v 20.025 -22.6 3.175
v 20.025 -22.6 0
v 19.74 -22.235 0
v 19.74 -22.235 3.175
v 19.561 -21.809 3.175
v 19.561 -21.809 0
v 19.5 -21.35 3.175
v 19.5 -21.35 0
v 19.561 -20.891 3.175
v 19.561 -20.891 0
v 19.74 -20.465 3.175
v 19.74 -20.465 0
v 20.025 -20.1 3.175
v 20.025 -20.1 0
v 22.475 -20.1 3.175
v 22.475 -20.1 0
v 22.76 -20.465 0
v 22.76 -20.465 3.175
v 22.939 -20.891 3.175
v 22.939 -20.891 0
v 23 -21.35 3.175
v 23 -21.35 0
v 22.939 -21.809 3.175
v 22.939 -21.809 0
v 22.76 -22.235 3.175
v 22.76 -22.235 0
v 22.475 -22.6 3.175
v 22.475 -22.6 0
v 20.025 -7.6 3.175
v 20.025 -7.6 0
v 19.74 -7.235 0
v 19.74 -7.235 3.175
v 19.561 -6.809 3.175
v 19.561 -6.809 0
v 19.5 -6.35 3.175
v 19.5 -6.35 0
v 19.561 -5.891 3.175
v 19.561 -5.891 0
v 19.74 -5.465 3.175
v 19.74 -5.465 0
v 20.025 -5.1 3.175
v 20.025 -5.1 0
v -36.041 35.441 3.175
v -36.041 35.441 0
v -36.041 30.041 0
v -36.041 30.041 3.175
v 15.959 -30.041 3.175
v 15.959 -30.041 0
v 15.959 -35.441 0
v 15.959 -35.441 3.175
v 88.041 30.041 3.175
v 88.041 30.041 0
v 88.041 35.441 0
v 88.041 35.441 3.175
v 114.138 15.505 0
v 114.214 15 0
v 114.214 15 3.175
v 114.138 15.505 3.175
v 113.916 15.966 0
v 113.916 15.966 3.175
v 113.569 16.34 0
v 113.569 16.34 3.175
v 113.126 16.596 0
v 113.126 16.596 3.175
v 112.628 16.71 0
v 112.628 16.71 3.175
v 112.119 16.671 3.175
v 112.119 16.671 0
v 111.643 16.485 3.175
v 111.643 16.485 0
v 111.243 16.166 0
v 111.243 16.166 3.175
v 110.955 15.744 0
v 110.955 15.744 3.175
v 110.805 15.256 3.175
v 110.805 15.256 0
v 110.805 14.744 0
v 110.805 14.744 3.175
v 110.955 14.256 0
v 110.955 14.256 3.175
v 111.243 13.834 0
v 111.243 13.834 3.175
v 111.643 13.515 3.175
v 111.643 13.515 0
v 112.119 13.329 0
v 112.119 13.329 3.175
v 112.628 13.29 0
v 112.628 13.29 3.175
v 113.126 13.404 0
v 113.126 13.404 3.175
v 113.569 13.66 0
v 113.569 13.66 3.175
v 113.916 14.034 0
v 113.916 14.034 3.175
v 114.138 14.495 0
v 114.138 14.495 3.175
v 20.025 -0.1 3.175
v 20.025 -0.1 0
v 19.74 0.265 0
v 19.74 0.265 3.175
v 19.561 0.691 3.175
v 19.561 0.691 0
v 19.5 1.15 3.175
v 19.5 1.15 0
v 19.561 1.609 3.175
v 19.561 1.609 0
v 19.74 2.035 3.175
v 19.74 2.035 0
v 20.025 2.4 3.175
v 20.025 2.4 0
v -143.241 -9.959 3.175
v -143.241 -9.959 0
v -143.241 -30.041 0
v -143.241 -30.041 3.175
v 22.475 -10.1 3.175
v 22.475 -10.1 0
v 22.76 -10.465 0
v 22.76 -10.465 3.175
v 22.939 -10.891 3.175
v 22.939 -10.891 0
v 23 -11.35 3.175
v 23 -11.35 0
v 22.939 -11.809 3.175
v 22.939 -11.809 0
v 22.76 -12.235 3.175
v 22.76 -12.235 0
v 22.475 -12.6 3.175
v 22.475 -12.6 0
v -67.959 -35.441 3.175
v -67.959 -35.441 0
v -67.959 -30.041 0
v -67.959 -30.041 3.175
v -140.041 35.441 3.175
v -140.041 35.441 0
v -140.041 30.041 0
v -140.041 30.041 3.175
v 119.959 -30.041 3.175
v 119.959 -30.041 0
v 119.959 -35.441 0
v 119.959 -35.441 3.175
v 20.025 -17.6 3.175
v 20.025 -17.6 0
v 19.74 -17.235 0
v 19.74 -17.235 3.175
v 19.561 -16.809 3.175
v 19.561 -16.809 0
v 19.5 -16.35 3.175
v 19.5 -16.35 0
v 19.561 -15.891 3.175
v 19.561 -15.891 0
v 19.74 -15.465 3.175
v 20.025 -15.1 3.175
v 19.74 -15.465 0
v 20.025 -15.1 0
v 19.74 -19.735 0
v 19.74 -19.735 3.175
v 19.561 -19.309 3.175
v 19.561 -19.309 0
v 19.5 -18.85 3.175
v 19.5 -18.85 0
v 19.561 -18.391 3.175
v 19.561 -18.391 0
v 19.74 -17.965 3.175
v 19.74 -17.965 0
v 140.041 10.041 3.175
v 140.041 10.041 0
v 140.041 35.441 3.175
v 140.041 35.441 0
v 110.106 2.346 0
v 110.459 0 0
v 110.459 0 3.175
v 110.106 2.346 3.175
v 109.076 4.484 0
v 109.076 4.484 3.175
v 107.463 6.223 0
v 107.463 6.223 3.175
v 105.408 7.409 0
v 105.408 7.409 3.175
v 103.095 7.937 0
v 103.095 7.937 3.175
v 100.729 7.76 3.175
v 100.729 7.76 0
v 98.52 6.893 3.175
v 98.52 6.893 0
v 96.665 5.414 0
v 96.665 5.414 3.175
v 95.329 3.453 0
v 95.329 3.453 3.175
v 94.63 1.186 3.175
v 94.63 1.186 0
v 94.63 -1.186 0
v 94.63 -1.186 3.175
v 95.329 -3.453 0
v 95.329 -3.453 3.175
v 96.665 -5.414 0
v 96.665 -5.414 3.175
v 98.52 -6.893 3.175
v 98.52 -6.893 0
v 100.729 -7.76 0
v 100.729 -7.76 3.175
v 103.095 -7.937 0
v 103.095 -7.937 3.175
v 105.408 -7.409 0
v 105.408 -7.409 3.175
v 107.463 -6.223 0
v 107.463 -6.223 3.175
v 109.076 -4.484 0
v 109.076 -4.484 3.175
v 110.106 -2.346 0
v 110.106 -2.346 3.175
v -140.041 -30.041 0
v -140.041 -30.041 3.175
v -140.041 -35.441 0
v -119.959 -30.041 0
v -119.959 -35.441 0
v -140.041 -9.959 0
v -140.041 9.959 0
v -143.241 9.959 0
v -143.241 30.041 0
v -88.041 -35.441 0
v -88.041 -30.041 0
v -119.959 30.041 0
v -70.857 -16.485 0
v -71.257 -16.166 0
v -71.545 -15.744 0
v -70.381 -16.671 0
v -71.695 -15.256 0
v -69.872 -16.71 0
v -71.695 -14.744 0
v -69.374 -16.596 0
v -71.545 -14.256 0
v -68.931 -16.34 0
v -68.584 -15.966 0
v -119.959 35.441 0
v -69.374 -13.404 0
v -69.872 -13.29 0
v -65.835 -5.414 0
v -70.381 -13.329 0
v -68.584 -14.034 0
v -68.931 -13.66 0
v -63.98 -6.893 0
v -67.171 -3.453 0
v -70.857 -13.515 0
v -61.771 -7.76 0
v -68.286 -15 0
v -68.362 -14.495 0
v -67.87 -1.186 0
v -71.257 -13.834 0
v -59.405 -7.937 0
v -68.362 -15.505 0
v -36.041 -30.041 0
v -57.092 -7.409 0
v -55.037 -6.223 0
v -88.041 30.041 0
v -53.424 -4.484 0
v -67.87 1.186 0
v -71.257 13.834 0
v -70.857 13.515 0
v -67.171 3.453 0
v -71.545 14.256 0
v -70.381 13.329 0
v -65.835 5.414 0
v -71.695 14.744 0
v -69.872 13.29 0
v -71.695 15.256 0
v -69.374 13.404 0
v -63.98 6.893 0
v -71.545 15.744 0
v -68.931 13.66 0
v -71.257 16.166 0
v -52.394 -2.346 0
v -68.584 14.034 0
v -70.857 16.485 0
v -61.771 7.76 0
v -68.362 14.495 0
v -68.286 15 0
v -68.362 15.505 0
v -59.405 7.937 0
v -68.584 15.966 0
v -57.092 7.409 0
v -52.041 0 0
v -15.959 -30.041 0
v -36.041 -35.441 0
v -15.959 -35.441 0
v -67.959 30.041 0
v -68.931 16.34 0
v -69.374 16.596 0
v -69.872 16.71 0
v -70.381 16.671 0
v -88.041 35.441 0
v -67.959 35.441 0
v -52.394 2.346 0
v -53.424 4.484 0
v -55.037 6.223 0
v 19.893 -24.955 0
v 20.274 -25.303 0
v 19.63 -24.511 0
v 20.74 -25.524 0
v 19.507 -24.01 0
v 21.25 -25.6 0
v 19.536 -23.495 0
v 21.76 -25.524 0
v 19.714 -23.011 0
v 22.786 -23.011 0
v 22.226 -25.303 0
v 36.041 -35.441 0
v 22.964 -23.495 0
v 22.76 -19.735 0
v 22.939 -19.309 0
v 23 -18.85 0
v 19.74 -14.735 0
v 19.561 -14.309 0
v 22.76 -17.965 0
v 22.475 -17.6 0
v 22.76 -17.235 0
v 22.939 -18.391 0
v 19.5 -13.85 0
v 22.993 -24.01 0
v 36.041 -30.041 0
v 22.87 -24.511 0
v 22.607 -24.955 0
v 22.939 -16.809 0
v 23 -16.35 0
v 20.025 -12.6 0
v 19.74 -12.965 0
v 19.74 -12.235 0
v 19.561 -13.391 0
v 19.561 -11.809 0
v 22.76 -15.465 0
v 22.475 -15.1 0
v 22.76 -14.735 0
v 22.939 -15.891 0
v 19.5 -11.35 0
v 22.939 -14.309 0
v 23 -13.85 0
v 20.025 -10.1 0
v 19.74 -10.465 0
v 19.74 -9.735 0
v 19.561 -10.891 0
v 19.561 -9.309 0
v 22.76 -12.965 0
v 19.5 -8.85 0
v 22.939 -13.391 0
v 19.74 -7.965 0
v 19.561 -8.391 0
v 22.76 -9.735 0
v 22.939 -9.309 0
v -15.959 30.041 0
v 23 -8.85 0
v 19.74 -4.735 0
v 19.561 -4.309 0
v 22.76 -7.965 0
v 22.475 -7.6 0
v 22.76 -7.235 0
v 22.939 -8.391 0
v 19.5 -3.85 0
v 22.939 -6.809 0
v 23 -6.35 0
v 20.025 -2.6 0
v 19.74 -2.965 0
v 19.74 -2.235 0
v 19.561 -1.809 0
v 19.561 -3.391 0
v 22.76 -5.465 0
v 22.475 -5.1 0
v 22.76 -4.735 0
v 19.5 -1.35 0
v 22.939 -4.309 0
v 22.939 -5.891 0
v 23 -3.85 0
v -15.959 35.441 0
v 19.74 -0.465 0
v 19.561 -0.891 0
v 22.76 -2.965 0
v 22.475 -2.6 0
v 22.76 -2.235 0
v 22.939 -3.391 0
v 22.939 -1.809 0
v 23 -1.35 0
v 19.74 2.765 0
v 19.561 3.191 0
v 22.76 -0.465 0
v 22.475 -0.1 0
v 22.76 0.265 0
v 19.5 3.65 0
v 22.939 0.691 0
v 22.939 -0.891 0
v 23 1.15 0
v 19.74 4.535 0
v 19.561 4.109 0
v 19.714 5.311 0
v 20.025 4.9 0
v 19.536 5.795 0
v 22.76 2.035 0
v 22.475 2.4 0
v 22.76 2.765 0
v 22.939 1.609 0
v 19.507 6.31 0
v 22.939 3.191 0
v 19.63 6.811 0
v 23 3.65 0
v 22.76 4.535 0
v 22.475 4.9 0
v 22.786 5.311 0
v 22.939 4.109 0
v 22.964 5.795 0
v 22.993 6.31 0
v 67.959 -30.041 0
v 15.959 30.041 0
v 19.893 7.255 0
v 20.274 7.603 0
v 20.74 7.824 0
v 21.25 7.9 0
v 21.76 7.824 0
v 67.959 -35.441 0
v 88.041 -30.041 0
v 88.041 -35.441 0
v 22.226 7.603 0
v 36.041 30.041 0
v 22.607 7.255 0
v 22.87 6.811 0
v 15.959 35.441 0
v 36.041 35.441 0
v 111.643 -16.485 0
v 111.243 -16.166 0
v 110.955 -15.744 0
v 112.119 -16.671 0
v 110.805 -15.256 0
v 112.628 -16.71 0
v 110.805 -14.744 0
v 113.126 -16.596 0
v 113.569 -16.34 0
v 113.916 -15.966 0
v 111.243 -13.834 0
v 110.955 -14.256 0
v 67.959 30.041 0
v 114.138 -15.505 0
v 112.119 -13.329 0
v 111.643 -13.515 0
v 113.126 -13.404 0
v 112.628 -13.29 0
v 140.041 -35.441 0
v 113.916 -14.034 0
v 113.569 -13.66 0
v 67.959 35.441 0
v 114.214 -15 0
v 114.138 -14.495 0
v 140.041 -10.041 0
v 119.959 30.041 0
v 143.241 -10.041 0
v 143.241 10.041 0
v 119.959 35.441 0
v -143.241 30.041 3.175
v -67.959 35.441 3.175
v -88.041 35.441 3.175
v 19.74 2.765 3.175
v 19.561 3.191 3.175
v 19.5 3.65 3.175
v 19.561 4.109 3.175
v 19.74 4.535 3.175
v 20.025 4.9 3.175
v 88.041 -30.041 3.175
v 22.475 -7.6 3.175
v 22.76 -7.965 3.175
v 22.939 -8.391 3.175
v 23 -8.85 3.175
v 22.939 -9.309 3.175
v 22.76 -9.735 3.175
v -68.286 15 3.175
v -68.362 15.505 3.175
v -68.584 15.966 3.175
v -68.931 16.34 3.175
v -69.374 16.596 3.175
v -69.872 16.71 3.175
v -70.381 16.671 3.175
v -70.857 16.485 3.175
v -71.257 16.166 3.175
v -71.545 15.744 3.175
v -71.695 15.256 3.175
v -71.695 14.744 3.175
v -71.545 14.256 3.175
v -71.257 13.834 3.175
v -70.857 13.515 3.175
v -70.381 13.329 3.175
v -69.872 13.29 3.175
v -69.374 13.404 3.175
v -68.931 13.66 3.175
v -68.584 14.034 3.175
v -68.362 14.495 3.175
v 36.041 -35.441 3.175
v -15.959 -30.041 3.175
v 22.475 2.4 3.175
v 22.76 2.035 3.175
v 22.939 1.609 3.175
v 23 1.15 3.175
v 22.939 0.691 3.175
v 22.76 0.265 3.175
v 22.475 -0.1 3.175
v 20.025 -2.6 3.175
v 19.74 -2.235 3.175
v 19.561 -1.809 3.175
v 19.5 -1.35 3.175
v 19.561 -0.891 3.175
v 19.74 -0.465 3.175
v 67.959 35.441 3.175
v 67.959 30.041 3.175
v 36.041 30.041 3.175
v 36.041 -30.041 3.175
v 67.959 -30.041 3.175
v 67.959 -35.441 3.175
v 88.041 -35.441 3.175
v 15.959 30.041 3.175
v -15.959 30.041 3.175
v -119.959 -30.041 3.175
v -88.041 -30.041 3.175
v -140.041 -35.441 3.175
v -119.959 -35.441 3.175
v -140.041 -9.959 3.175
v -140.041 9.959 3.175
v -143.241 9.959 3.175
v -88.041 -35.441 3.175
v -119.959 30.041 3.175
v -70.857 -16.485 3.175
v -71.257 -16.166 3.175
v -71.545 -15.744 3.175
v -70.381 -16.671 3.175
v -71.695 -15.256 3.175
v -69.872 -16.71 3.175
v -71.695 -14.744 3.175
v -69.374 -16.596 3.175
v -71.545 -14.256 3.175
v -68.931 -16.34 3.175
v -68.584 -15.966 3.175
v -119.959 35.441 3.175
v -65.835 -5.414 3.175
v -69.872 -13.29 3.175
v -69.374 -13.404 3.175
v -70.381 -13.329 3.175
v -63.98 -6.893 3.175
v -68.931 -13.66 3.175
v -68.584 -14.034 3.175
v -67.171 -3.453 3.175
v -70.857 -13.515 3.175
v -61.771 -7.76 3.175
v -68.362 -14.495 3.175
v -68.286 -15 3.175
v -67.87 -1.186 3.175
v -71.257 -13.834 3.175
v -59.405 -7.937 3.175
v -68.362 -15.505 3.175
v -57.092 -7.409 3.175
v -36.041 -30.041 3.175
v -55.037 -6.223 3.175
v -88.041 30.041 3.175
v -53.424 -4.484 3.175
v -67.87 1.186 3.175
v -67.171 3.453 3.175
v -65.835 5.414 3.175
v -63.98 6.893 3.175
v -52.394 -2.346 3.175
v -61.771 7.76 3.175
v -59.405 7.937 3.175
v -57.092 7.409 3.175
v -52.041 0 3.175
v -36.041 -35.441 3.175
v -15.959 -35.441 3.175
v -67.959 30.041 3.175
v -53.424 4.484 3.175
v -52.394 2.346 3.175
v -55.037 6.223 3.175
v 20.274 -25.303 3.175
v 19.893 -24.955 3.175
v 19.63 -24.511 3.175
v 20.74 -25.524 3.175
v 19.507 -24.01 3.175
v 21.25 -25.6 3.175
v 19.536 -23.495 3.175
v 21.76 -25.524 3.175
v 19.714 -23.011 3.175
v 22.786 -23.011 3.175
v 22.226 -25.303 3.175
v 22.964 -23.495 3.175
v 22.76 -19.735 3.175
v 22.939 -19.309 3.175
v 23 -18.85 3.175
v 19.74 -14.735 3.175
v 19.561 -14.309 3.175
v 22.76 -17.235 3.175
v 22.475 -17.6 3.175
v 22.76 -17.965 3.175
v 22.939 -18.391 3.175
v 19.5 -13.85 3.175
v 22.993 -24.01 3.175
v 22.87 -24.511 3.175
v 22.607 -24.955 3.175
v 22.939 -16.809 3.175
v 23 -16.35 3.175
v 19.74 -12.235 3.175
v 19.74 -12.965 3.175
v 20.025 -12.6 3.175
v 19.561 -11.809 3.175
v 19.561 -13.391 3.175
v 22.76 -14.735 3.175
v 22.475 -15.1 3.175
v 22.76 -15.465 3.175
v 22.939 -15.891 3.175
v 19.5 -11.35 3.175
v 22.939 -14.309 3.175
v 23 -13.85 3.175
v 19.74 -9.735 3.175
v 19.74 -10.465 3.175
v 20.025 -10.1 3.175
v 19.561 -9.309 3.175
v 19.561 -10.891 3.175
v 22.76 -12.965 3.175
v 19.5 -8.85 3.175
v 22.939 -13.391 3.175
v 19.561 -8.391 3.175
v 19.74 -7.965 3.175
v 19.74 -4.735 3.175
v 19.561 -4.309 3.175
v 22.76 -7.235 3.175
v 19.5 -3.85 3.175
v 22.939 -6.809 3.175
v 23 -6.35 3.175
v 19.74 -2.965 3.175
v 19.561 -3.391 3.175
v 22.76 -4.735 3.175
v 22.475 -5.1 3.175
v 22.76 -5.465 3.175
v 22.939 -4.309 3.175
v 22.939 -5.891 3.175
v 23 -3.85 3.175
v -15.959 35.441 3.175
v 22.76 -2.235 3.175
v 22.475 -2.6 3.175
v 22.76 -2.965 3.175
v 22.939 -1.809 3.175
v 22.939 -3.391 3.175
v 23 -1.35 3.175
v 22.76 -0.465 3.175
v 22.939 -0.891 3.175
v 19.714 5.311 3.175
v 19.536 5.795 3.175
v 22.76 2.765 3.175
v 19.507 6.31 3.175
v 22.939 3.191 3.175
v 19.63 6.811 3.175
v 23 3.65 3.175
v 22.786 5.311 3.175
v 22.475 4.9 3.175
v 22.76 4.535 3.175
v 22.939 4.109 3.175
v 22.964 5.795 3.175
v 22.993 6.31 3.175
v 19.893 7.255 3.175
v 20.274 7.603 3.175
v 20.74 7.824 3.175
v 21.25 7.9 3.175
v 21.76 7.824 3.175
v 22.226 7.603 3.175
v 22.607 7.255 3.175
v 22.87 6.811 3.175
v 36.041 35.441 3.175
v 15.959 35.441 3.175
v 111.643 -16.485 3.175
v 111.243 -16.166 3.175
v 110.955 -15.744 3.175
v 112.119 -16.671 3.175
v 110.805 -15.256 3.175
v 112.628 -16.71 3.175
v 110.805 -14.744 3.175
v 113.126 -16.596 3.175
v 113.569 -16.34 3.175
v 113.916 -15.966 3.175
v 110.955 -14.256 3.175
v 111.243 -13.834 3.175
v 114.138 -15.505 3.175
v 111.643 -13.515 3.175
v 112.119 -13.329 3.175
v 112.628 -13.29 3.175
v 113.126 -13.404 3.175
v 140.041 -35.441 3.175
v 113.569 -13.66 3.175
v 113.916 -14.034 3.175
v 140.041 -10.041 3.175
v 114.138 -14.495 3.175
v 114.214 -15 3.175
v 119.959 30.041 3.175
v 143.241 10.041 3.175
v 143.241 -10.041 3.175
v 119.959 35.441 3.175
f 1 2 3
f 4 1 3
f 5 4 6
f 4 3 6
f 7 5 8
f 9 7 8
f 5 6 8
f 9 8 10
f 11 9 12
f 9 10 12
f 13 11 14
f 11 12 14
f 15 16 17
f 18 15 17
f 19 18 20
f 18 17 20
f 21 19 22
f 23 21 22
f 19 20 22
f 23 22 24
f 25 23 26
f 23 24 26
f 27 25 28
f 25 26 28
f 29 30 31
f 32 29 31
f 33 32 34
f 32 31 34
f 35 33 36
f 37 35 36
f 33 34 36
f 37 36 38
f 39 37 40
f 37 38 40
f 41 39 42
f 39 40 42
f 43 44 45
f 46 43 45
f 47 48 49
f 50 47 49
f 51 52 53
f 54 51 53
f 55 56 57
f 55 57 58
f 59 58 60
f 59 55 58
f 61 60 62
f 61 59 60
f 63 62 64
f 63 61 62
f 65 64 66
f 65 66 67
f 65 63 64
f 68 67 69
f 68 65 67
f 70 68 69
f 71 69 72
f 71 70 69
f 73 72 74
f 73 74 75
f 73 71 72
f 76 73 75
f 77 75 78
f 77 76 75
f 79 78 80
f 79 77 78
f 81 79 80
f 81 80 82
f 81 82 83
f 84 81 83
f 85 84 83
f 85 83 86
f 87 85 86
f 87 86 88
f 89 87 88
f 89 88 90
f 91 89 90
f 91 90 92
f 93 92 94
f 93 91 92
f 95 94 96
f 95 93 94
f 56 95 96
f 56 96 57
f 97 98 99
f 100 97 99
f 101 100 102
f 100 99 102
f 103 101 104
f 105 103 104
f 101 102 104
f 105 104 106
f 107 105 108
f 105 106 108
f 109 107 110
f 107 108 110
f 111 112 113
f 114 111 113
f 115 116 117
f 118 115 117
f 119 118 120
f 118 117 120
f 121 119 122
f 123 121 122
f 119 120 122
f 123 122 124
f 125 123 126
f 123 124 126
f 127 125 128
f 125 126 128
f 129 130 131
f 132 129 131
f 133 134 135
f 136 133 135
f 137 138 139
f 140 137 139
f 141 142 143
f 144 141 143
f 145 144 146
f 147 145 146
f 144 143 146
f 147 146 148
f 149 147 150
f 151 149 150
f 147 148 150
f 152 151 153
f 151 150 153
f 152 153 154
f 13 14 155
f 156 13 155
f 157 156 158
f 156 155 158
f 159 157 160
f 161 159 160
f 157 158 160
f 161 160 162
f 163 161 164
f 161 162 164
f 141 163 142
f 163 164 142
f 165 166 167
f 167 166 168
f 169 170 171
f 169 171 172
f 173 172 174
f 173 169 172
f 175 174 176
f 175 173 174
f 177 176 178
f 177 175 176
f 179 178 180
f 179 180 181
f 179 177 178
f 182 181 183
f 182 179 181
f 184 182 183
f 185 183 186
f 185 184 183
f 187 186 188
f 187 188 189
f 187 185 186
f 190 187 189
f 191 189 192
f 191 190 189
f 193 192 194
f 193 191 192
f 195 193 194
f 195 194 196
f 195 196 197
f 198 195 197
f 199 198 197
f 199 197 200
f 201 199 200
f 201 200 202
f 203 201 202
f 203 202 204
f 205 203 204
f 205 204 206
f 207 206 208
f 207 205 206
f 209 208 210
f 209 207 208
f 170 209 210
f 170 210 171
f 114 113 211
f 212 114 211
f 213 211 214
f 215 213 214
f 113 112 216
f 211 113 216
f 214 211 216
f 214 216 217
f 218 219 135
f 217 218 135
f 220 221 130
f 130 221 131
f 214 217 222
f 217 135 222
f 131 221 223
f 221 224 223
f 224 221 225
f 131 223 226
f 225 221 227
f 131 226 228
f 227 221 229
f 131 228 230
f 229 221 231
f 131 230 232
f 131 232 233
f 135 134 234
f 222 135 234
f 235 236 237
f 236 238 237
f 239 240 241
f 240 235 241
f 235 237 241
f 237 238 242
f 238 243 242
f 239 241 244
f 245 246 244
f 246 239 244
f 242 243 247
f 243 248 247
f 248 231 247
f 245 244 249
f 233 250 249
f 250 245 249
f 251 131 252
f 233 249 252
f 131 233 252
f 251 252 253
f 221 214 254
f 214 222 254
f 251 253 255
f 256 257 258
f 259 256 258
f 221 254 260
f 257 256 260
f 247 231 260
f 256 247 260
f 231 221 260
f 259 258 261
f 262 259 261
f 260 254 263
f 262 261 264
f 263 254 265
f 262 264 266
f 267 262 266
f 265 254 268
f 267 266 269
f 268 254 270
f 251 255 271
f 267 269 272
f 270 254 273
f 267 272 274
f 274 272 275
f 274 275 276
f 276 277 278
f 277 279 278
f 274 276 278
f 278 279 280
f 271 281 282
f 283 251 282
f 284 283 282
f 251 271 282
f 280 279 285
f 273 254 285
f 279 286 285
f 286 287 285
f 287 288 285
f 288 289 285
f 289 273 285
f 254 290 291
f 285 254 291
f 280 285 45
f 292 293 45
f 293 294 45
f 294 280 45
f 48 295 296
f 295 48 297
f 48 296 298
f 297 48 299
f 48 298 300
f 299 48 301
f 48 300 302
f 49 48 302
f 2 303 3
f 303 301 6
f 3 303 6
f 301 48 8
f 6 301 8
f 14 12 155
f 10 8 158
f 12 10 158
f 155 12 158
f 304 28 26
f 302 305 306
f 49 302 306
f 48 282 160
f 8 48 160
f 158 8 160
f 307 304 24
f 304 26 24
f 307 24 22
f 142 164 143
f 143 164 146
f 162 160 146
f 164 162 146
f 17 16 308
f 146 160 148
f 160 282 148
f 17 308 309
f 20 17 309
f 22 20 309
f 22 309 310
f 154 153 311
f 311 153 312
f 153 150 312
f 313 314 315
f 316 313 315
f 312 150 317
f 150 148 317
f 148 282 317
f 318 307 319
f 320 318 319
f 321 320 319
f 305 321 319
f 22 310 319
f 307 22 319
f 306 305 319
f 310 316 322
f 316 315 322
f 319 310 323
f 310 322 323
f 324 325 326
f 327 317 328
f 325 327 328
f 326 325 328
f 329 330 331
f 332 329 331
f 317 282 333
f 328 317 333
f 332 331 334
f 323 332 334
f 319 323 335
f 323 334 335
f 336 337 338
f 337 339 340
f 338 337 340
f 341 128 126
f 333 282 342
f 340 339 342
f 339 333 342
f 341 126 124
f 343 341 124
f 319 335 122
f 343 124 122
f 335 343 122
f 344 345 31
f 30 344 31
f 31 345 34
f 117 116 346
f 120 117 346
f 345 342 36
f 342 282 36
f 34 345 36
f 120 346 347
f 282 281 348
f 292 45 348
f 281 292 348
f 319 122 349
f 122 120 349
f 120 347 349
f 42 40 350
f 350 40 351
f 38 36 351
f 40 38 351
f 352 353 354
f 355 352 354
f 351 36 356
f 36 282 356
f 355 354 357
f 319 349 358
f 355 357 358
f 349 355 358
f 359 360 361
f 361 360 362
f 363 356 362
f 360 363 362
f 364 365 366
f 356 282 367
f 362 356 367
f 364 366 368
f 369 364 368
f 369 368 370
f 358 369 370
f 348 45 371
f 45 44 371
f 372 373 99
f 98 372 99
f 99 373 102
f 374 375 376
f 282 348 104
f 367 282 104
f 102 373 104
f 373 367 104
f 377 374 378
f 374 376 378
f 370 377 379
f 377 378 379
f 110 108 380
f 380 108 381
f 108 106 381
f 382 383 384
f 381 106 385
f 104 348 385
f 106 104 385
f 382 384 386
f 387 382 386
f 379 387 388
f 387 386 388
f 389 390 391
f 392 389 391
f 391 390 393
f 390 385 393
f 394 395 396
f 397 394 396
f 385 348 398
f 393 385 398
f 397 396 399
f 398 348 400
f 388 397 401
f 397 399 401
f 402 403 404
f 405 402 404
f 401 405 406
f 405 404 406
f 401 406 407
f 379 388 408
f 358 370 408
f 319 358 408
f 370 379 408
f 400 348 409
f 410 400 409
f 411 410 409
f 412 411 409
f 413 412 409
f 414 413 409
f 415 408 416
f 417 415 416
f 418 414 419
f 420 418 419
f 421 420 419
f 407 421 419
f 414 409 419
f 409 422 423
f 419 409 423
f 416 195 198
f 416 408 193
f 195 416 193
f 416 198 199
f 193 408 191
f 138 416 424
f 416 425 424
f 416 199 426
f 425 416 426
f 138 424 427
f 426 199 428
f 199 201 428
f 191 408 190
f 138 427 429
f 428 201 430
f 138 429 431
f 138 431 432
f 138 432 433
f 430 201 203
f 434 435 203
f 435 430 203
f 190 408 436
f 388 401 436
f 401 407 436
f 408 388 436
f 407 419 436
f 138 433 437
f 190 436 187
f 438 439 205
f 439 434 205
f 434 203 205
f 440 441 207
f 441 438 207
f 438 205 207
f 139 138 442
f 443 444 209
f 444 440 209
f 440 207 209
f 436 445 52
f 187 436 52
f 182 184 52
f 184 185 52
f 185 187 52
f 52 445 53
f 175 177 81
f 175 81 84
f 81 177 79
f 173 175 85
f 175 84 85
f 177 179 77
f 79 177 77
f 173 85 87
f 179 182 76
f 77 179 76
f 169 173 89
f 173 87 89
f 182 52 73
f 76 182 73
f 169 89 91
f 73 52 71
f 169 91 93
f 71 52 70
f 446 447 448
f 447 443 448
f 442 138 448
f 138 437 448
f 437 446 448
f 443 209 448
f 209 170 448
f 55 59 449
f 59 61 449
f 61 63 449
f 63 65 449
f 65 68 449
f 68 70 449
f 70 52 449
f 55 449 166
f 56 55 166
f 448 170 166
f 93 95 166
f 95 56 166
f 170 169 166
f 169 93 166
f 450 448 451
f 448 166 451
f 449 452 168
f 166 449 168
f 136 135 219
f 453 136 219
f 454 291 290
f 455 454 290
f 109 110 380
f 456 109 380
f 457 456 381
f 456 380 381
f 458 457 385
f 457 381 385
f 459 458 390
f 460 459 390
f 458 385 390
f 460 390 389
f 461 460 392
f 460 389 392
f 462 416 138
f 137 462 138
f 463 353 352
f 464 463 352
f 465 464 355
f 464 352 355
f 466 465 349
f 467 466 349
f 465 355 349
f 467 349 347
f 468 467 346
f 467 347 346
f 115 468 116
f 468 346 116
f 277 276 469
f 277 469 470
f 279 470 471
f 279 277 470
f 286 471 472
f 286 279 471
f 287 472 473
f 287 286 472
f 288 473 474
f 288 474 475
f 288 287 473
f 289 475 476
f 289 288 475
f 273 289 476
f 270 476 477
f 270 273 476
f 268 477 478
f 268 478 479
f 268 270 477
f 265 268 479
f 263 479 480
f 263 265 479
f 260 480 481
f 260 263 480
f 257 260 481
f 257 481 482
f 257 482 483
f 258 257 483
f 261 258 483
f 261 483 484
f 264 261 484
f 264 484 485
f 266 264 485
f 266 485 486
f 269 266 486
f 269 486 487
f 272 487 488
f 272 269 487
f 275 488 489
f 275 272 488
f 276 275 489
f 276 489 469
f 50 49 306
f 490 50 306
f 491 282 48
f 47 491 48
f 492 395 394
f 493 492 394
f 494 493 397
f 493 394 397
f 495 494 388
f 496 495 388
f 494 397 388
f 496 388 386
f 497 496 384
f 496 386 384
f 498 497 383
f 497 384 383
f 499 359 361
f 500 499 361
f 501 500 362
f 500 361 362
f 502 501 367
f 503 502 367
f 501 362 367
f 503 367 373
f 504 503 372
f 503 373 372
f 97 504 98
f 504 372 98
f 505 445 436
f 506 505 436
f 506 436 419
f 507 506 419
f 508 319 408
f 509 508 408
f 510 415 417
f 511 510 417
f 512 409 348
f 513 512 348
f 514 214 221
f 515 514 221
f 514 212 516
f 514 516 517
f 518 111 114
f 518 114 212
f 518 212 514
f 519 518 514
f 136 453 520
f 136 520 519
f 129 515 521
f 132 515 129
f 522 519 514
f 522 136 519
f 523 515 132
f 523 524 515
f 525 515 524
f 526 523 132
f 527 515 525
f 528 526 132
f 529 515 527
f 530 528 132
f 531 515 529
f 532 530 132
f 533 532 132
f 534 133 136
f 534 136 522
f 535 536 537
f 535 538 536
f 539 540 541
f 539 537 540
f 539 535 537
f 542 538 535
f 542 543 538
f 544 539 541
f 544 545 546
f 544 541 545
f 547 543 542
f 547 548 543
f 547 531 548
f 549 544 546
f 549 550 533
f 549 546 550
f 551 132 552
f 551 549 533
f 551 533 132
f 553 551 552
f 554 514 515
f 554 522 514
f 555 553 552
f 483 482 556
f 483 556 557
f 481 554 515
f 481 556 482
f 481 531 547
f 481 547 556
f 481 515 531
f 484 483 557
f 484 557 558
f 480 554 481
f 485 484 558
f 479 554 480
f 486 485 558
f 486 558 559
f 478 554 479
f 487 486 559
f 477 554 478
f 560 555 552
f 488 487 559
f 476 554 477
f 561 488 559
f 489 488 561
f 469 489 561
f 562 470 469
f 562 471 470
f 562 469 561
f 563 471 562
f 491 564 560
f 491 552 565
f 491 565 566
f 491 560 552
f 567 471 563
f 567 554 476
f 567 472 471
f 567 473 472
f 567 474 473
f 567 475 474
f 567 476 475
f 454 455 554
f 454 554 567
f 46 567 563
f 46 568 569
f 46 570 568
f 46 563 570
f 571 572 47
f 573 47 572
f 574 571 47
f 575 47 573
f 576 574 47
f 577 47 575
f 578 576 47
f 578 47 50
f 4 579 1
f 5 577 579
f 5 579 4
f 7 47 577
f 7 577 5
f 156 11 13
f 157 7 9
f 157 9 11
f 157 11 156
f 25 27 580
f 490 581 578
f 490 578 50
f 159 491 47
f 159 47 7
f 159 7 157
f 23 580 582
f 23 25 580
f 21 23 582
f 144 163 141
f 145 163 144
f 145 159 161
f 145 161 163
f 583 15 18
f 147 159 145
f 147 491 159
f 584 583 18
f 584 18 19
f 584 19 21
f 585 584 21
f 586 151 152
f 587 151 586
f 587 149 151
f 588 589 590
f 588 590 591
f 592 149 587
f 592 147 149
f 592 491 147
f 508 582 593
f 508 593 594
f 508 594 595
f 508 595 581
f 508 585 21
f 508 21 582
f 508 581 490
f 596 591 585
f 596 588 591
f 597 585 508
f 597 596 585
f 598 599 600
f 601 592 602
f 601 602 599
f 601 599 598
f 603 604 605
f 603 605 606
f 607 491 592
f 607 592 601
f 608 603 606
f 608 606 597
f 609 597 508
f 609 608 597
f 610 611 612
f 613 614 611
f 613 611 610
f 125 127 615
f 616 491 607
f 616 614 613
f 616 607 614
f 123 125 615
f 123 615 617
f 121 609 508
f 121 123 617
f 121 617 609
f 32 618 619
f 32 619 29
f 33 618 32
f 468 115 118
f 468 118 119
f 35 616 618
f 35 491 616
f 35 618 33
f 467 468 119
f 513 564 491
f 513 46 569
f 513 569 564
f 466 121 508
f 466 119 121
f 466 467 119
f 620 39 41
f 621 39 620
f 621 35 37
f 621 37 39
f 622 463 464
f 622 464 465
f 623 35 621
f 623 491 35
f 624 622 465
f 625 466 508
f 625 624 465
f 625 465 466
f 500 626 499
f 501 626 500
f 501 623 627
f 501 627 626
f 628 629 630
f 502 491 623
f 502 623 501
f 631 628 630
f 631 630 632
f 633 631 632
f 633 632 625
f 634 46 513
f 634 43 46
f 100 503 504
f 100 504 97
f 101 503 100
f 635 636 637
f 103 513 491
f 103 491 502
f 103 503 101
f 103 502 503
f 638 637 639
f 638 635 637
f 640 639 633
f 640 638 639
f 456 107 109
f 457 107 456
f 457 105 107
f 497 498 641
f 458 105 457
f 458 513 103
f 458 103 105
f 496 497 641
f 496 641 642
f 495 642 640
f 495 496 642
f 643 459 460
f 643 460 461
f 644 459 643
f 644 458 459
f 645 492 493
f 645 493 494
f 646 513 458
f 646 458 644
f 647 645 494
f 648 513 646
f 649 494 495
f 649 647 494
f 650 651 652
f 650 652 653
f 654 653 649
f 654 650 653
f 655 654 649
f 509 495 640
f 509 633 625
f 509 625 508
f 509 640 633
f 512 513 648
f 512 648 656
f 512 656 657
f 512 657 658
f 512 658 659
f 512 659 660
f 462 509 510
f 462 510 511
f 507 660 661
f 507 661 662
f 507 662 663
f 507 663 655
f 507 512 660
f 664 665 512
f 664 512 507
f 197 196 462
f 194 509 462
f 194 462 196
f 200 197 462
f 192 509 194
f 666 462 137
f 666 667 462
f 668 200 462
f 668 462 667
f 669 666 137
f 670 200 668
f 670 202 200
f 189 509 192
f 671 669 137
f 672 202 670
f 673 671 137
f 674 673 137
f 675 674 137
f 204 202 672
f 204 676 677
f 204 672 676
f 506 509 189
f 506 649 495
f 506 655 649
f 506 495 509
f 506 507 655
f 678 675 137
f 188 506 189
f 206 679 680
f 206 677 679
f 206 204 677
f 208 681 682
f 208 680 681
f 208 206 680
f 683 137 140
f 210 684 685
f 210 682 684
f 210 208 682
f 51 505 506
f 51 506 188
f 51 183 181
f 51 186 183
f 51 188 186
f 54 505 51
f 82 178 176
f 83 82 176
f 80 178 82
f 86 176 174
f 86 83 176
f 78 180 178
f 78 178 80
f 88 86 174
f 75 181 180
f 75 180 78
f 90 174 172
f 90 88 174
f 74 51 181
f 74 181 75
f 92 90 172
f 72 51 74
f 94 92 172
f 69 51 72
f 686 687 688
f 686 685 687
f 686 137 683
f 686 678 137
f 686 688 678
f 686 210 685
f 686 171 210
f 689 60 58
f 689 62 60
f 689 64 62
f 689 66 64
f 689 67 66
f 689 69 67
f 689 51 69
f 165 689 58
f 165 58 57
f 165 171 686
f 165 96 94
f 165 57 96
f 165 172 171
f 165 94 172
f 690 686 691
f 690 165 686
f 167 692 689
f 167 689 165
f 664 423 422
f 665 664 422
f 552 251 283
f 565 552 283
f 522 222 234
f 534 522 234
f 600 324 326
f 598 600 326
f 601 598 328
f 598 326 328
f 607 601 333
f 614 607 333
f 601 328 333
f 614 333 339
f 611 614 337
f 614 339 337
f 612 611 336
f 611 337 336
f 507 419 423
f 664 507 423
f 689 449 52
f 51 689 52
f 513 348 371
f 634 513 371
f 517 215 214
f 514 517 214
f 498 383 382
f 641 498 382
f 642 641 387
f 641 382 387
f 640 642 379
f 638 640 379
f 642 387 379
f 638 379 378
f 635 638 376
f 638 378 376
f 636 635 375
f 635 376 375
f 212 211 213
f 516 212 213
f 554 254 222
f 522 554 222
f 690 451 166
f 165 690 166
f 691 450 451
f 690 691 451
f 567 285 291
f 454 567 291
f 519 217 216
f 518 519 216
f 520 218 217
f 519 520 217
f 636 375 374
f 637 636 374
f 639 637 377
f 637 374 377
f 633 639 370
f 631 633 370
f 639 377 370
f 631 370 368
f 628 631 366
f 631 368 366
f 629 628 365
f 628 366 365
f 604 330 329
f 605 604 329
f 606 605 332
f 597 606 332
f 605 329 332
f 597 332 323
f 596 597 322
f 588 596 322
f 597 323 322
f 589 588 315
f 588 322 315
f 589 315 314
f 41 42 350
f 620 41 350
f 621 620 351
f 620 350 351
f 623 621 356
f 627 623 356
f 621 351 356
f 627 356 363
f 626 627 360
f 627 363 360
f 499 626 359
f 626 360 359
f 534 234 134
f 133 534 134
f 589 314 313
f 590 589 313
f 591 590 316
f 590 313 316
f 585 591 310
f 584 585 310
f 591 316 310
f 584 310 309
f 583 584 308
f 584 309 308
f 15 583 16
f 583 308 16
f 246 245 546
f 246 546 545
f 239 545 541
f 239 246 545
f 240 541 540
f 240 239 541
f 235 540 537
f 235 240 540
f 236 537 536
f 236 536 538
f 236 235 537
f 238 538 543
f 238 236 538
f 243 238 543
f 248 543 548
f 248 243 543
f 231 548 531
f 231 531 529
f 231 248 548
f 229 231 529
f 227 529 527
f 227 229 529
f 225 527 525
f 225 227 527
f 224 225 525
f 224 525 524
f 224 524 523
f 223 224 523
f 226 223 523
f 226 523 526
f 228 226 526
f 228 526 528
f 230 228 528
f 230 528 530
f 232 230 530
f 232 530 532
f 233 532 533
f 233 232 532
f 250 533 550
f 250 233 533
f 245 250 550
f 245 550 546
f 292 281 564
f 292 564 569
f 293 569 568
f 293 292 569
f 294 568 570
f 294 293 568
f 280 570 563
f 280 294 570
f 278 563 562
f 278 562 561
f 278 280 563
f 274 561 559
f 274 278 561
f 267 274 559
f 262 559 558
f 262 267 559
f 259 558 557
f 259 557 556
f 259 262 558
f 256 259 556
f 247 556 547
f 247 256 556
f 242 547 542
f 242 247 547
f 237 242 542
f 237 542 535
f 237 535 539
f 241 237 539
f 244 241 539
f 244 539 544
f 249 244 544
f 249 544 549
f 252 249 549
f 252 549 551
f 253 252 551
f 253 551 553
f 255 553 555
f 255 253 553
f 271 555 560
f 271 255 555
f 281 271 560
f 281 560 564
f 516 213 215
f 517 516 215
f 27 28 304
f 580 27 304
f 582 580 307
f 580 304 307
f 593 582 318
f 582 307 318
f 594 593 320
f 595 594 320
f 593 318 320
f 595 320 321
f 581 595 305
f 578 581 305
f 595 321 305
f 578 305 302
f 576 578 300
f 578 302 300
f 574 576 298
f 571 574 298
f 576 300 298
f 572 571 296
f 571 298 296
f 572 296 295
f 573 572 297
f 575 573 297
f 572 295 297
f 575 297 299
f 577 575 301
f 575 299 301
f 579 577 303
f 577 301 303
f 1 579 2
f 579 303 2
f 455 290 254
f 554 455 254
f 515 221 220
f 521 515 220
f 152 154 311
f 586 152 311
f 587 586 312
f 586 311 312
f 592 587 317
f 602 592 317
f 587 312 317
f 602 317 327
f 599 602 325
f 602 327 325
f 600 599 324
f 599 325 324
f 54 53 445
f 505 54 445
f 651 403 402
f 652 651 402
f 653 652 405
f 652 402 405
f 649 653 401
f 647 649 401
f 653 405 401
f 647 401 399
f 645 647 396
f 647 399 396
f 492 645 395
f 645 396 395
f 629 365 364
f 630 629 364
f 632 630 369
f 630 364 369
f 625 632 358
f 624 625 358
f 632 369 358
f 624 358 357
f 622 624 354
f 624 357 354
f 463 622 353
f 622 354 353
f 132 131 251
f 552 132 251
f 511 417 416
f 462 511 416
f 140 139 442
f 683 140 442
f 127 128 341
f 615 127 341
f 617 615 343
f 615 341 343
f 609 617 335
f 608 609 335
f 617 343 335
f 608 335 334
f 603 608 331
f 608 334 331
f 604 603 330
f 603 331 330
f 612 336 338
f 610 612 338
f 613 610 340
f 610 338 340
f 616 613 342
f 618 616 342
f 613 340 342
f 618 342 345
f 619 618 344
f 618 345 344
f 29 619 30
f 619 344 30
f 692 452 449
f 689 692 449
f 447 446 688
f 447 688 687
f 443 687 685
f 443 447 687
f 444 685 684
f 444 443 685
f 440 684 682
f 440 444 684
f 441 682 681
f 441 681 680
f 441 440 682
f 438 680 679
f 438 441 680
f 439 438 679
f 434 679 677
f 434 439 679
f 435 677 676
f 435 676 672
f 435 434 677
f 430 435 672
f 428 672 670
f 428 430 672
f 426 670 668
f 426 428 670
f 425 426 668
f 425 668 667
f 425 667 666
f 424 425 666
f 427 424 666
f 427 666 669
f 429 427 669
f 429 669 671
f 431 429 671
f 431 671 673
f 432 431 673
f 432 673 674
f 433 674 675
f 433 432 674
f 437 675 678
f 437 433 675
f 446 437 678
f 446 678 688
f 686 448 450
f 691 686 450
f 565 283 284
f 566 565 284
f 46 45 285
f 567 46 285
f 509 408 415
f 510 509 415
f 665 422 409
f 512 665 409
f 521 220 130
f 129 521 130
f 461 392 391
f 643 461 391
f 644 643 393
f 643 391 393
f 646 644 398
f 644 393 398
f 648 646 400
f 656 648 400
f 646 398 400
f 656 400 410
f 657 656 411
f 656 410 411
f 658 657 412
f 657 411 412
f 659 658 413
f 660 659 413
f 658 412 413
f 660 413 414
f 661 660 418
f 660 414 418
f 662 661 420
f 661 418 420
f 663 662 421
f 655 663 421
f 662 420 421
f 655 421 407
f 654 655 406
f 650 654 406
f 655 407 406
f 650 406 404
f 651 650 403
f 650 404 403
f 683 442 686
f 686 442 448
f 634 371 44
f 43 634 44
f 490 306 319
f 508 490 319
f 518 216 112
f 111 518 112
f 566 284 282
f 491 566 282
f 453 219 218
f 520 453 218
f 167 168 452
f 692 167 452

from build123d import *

# Parameters (mm, degrees)
BOSS_EXTRUDE1_OUTLINE_R   = 1.755
BOSS_EXTRUDE1_OUTLINE_R_2 = 8
BOSS_EXTRUDE1_DEPTH       = 3.175
BOSS_EXTRUDE2_START       = -3.175
SKETCH5_R                 = 7.95936
SKETCH5_R_2               = 1.71436
BOSS_EXTRUDE2_DEPTH       = 3.175


# Read off the part's stored shape, not the designer's step: Boss-Extrude1
with BuildPart() as part:
    # Boss-Extrude1 outline → Boss-Extrude1 (new body)
    with BuildSketch(Plane.XY):
        Polygon((-140, 10), (-140, -10), (-143.2, -10), (-143.2, -30), (-140, -30), (-140, -35.4), (-120, -35.4), (-120, -30), (-88, -30), (-88, -35.4), (-68, -35.4), (-68, -30), (-36, -30), (-36, -35.4), (-16, -35.4), (-16, -30), (16, -30), (16, -35.4), (36, -35.4), (36, -30), (68, -30), (68, -35.4), (88, -35.4), (88, -30), (120, -30), (120, -35.4), (140, -35.4), (140, -10), (143.2, -10), (143.2, 10), (140, 10), (140, 35.4), (120, 35.4), (120, 30), (88, 30), (88, 35.4), (68, 35.4), (68, 30), (36, 30), (36, 35.4), (16, 35.4), (16, 30), (-16, 30), (-16, 35.4), (-36, 35.4), (-36, 30), (-68, 30), (-68, 35.4), (-88, 35.4), (-88, 30), (-120, 30), (-120, 35.4), (-140, 35.4), (-140, 30), (-143.2, 30), (-143.2, 10), align=None)
        with Locations((-70, -15)):
            Circle(BOSS_EXTRUDE1_OUTLINE_R, mode=Mode.SUBTRACT)
        with BuildLine():
            ThreePointArc((22.474744871, -20.1), (23, -21.35), (22.474744871, -22.6))
            ThreePointArc((22.474744871, -22.6), (21.25, -25.6), (20.025255129, -22.6))
            ThreePointArc((20.025255129, -22.6), (19.5, -21.35), (20.025255129, -20.1))
            ThreePointArc((20.025255129, -20.1), (19.5, -18.85), (20.025255129, -17.6))
            ThreePointArc((20.025255129, -17.6), (19.5, -16.35), (20.025255129, -15.1))
            ThreePointArc((20.025255129, -15.1), (19.5, -13.85), (20.025255129, -12.6))
            ThreePointArc((20.025255129, -12.6), (19.5, -11.35), (20.025255129, -10.1))
            ThreePointArc((20.025255129, -10.1), (19.5, -8.85), (20.025255129, -7.6))
            ThreePointArc((20.025255129, -7.6), (19.5, -6.35), (20.025255129, -5.1))
            ThreePointArc((20.025255129, -5.1), (19.5, -3.85), (20.025255129, -2.6))
            ThreePointArc((20.025255129, -2.6), (19.5, -1.35), (20.025255129, -0.1))
            ThreePointArc((20.025255129, -0.1), (19.5, 1.15), (20.025255129, 2.4))
            ThreePointArc((20.025255129, 2.4), (19.5, 3.65), (20.025255129, 4.9))
            ThreePointArc((20.025255129, 4.9), (21.25, 7.9), (22.474744871, 4.9))
            ThreePointArc((22.474744871, 4.9), (23, 3.65), (22.474744871, 2.4))
            ThreePointArc((22.474744871, 2.4), (23, 1.15), (22.474744871, -0.1))
            ThreePointArc((22.474744871, -0.1), (23, -1.35), (22.474744871, -2.6))
            ThreePointArc((22.474744871, -2.6), (23, -3.85), (22.474744871, -5.1))
            ThreePointArc((22.474744871, -5.1), (23, -6.35), (22.474744871, -7.6))
            ThreePointArc((22.474744871, -7.6), (23, -8.85), (22.474744871, -10.1))
            ThreePointArc((22.474744871, -10.1), (23, -11.35), (22.474744871, -12.6))
            ThreePointArc((22.474744871, -12.6), (23, -13.85), (22.474744871, -15.1))
            ThreePointArc((22.474744871, -15.1), (23, -16.35), (22.474744871, -17.6))
            ThreePointArc((22.474744871, -17.6), (23, -18.85), (22.474744871, -20.1))
        make_face(mode=Mode.SUBTRACT)
        with Locations((112.5, -15)):
            Circle(BOSS_EXTRUDE1_OUTLINE_R, mode=Mode.SUBTRACT)
        with Locations((-60, 0)):
            Circle(BOSS_EXTRUDE1_OUTLINE_R_2, mode=Mode.SUBTRACT)
        with Locations((-70, 15)):
            Circle(BOSS_EXTRUDE1_OUTLINE_R, mode=Mode.SUBTRACT)
        with Locations((102.5, 0)):
            Circle(BOSS_EXTRUDE1_OUTLINE_R_2, mode=Mode.SUBTRACT)
        with Locations((112.5, 15)):
            Circle(BOSS_EXTRUDE1_OUTLINE_R, mode=Mode.SUBTRACT)
    extrude(amount=BOSS_EXTRUDE1_DEPTH)

    # Sketch5 → Boss-Extrude2 (add)
    with BuildSketch(Plane.XY.offset(3.175).offset(BOSS_EXTRUDE2_START)):
        Polygon((140.04064, 10.04064), (140.04064, 35.44064), (119.95936, 35.44064), (119.95936, 30.04064), (88.04064, 30.04064), (88.04064, 35.44064), (67.95936, 35.44064), (67.95936, 30.04064), (36.04064, 30.04064), (36.04064, 35.44064), (15.95936, 35.44064), (15.95936, 30.04064), (-15.95936, 30.04064), (-15.95936, 35.44064), (-36.04064, 35.44064), (-36.04064, 30.04064), (-67.95936, 30.04064), (-67.95936, 35.44064), (-88.04064, 35.44064), (-88.04064, 30.04064), (-119.95936, 30.04064), (-119.95936, 35.44064), (-140.04064, 35.44064), (-140.04064, 30.04064), (-143.24064, 30.04064), (-143.24064, 9.95936), (-140.04064, 9.95936), (-140.04064, -9.95936), (-143.24064, -9.95936), (-143.24064, -30.04064), (-140.04064, -30.04064), (-140.04064, -35.44064), (-119.95936, -35.44064), (-119.95936, -30.04064), (-88.04064, -30.04064), (-88.04064, -35.44064), (-67.95936, -35.44064), (-67.95936, -30.04064), (-36.04064, -30.04064), (-36.04064, -35.44064), (-15.95936, -35.44064), (-15.95936, -30.04064), (15.95936, -30.04064), (15.95936, -35.44064), (36.04064, -35.44064), (36.04064, -30.04064), (67.95936, -30.04064), (67.95936, -35.44064), (88.04064, -35.44064), (88.04064, -30.04064), (119.95936, -30.04064), (119.95936, -35.44064), (140.04064, -35.44064), (140.04064, -10.04064), (143.24064, -10.04064), (143.24064, 10.04064), align=None)
        with Locations((-60, 0)):
            Circle(SKETCH5_R, mode=Mode.SUBTRACT)
        with Locations((-70, 15)):
            Circle(SKETCH5_R_2, mode=Mode.SUBTRACT)
        with Locations((-70, -15)):
            Circle(SKETCH5_R_2, mode=Mode.SUBTRACT)
        with Locations((102.5, 0)):
            Circle(SKETCH5_R, mode=Mode.SUBTRACT)
        with Locations((112.5, 15)):
            Circle(SKETCH5_R_2, mode=Mode.SUBTRACT)
        with Locations((112.5, -15)):
            Circle(SKETCH5_R_2, mode=Mode.SUBTRACT)
        with BuildLine():
            ThreePointArc((22.474744871, 4.9), (21.25, 7.9), (20.025255129, 4.9))
            ThreePointArc((20.025255129, 4.9), (19.5, 3.65), (20.025255129, 2.4))
            ThreePointArc((20.025255129, 2.4), (19.5, 1.15), (20.025255129, -0.1))
            ThreePointArc((20.025255129, -0.1), (19.5, -1.35), (20.025255129, -2.6))
            ThreePointArc((20.025255129, -2.6), (19.5, -3.85), (20.025255129, -5.1))
            ThreePointArc((20.025255129, -5.1), (19.5, -6.35), (20.025255129, -7.6))
            ThreePointArc((20.025255129, -7.6), (19.5, -8.85), (20.025255129, -10.1))
            ThreePointArc((20.025255129, -10.1), (19.5, -11.35), (20.025255129, -12.6))
            ThreePointArc((20.025255129, -12.6), (19.5, -13.85), (20.025255129, -15.1))
            ThreePointArc((20.025255129, -15.1), (19.5, -16.35), (20.025255129, -17.6))
            ThreePointArc((20.025255129, -17.6), (19.5, -18.85), (20.025255129, -20.1))
            ThreePointArc((20.025255129, -20.1), (19.5, -21.35), (20.025255129, -22.6))
            ThreePointArc((20.025255129, -22.6), (21.25, -25.6), (22.474744871, -22.6))
            ThreePointArc((22.474744871, -22.6), (23, -21.35), (22.474744871, -20.1))
            ThreePointArc((22.474744871, -20.1), (23, -18.85), (22.474744871, -17.6))
            ThreePointArc((22.474744871, -17.6), (23, -16.35), (22.474744871, -15.1))
            ThreePointArc((22.474744871, -15.1), (23, -13.85), (22.474744871, -12.6))
            ThreePointArc((22.474744871, -12.6), (23, -11.35), (22.474744871, -10.1))
            ThreePointArc((22.474744871, -10.1), (23, -8.85), (22.474744871, -7.6))
            ThreePointArc((22.474744871, -7.6), (23, -6.35), (22.474744871, -5.1))
            ThreePointArc((22.474744871, -5.1), (23, -3.85), (22.474744871, -2.6))
            ThreePointArc((22.474744871, -2.6), (23, -1.35), (22.474744871, -0.1))
            ThreePointArc((22.474744871, -0.1), (23, 1.15), (22.474744871, 2.4))
            ThreePointArc((22.474744871, 2.4), (23, 3.65), (22.474744871, 4.9))
        make_face(mode=Mode.SUBTRACT)
    extrude(amount=BOSS_EXTRUDE2_DEPTH)


solid = part.part
